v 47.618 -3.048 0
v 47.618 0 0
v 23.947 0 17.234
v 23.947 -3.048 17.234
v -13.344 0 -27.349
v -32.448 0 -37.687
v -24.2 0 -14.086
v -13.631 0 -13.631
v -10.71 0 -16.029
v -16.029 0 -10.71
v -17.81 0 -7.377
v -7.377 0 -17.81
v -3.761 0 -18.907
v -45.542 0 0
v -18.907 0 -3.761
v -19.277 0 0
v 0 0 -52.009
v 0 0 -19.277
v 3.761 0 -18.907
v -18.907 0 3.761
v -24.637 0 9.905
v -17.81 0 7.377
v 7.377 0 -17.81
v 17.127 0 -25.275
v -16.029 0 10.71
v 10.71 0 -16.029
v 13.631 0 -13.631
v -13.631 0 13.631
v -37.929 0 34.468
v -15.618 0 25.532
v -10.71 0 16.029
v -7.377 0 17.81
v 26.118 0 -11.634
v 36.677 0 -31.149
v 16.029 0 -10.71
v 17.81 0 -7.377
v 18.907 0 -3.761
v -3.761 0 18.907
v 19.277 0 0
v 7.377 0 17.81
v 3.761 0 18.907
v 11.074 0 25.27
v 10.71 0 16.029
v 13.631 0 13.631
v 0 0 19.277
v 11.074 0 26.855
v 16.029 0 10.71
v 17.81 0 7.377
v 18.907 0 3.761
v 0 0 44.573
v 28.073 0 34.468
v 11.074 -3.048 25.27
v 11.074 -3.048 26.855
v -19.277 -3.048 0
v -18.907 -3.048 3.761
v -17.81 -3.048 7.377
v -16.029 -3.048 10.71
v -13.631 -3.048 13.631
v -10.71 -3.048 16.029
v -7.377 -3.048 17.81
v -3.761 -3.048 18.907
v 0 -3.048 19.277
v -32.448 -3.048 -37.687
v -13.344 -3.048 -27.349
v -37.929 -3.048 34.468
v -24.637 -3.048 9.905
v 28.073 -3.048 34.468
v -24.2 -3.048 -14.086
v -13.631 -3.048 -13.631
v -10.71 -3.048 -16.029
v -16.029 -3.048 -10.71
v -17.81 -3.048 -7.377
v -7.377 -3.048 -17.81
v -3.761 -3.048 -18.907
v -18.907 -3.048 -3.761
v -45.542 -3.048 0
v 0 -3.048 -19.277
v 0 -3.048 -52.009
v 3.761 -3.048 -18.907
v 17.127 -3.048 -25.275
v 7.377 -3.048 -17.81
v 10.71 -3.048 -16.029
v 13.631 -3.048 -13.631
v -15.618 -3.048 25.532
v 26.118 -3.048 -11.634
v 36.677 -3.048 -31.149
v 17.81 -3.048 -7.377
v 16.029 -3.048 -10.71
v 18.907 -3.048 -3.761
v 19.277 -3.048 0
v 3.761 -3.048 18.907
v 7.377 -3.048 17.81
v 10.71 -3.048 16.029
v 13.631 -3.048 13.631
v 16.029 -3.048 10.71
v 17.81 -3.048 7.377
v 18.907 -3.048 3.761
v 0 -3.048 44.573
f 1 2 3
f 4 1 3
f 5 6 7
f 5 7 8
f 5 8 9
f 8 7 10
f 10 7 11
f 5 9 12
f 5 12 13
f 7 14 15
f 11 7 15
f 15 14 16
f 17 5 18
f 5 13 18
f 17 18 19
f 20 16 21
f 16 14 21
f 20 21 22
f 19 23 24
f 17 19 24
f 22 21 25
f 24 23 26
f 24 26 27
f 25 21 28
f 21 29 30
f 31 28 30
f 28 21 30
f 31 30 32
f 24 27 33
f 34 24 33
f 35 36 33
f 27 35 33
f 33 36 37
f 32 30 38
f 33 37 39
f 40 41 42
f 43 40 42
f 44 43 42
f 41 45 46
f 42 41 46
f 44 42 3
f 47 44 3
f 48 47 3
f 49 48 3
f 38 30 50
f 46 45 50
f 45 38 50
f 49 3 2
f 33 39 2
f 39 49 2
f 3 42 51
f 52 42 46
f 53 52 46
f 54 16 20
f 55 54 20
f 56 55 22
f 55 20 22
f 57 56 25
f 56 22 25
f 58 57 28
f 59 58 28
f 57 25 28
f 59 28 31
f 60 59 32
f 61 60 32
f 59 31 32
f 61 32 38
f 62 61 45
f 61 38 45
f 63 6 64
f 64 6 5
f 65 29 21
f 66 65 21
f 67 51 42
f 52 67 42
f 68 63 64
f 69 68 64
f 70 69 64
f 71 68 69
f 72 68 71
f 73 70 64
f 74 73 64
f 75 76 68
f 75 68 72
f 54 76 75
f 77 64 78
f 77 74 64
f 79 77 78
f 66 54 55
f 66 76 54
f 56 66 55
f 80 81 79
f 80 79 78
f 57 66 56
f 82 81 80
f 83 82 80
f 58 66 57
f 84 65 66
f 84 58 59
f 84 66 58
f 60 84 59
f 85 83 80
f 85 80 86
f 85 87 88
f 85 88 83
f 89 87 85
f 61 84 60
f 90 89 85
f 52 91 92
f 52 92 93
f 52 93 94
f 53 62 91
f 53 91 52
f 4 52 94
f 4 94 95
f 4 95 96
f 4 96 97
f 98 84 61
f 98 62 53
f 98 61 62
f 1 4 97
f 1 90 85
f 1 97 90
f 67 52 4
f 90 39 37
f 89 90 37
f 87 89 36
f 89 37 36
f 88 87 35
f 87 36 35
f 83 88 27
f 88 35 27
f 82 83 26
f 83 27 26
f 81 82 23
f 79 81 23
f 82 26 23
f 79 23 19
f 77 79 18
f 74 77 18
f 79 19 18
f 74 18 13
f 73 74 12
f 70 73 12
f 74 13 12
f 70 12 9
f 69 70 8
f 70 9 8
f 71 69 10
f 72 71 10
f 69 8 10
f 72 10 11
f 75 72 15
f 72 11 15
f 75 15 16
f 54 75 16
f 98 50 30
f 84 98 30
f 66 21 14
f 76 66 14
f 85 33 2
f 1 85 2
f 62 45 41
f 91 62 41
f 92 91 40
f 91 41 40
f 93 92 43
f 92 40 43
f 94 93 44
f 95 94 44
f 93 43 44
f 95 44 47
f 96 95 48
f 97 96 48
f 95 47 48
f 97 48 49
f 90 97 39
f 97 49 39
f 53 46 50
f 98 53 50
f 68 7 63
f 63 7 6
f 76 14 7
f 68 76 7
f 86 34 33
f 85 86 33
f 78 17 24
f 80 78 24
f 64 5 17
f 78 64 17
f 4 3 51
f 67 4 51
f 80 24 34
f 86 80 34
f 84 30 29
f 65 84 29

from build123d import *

# Parameters (mm, degrees)
F1_DEPTH = 3.048


with BuildPart() as f1:
    # F0 (on Front) → F1 (new body)
    with BuildSketch(Plane.XZ):
        with BuildLine():
            ThreePointArc((0, 19.277473), (13.631232, 13.631232), (19.277473, 0))
            ThreePointArc((19.277473, 0), (0, -19.277473), (-19.277473, 0))
            Line((-19.277473, 0), (-24.200103, -14.086255))
            Line((-24.200103, -14.086255), (-32.447593, -37.686701))
            Line((-32.447593, -37.686701), (-13.343572, -27.349228))
            Line((-13.343572, -27.349228), (0, -20.12882))
            Line((0, -20.12882), (17.126714, -25.274702))
            Line((17.126714, -25.274702), (36.677146, -31.148814))
            Line((36.677146, -31.148814), (26.117608, -11.634409))
            Line((26.117608, -11.634409), (19.822054, 0))
            Line((19.822054, 0), (23.947323, 17.233988))
            Line((23.947323, 17.233988), (28.072593, 34.467977))
            Line((28.072593, 34.467977), (11.074049, 25.269808))
            Line((11.074049, 25.269808), (0, 19.277473))
        make_face()
        with BuildLine():
            ThreePointArc((-19.277473, 0), (-13.631232, 13.631232), (0, 19.277473))
            Line((0, 19.277473), (-15.617592, 25.532357))
            Line((-15.617592, 25.532357), (-37.928615, 34.467977))
            Line((-37.928615, 34.467977), (-24.637008, 9.904611))
            Line((-24.637008, 9.904611), (-19.277473, 0))
        make_face()
        Polygon((-15.617592, 25.532357), (0, 19.277473), (11.074049, 25.269808), (11.074049, 26.854567), (0, 44.573046), align=None)
        Polygon((-24.200103, -14.086255), (-19.277473, 0), (-24.637008, 9.904611), (-45.542024, 0), align=None)
        Polygon((47.618411, 0), (23.947323, 17.233988), (19.822054, 0), (26.117608, -11.634409), align=None)
        Polygon((0, -20.12882), (-13.343572, -27.349228), (0, -52.008626), (17.126714, -25.274702), align=None)
    extrude(amount=F1_DEPTH)


solid = f1.part
